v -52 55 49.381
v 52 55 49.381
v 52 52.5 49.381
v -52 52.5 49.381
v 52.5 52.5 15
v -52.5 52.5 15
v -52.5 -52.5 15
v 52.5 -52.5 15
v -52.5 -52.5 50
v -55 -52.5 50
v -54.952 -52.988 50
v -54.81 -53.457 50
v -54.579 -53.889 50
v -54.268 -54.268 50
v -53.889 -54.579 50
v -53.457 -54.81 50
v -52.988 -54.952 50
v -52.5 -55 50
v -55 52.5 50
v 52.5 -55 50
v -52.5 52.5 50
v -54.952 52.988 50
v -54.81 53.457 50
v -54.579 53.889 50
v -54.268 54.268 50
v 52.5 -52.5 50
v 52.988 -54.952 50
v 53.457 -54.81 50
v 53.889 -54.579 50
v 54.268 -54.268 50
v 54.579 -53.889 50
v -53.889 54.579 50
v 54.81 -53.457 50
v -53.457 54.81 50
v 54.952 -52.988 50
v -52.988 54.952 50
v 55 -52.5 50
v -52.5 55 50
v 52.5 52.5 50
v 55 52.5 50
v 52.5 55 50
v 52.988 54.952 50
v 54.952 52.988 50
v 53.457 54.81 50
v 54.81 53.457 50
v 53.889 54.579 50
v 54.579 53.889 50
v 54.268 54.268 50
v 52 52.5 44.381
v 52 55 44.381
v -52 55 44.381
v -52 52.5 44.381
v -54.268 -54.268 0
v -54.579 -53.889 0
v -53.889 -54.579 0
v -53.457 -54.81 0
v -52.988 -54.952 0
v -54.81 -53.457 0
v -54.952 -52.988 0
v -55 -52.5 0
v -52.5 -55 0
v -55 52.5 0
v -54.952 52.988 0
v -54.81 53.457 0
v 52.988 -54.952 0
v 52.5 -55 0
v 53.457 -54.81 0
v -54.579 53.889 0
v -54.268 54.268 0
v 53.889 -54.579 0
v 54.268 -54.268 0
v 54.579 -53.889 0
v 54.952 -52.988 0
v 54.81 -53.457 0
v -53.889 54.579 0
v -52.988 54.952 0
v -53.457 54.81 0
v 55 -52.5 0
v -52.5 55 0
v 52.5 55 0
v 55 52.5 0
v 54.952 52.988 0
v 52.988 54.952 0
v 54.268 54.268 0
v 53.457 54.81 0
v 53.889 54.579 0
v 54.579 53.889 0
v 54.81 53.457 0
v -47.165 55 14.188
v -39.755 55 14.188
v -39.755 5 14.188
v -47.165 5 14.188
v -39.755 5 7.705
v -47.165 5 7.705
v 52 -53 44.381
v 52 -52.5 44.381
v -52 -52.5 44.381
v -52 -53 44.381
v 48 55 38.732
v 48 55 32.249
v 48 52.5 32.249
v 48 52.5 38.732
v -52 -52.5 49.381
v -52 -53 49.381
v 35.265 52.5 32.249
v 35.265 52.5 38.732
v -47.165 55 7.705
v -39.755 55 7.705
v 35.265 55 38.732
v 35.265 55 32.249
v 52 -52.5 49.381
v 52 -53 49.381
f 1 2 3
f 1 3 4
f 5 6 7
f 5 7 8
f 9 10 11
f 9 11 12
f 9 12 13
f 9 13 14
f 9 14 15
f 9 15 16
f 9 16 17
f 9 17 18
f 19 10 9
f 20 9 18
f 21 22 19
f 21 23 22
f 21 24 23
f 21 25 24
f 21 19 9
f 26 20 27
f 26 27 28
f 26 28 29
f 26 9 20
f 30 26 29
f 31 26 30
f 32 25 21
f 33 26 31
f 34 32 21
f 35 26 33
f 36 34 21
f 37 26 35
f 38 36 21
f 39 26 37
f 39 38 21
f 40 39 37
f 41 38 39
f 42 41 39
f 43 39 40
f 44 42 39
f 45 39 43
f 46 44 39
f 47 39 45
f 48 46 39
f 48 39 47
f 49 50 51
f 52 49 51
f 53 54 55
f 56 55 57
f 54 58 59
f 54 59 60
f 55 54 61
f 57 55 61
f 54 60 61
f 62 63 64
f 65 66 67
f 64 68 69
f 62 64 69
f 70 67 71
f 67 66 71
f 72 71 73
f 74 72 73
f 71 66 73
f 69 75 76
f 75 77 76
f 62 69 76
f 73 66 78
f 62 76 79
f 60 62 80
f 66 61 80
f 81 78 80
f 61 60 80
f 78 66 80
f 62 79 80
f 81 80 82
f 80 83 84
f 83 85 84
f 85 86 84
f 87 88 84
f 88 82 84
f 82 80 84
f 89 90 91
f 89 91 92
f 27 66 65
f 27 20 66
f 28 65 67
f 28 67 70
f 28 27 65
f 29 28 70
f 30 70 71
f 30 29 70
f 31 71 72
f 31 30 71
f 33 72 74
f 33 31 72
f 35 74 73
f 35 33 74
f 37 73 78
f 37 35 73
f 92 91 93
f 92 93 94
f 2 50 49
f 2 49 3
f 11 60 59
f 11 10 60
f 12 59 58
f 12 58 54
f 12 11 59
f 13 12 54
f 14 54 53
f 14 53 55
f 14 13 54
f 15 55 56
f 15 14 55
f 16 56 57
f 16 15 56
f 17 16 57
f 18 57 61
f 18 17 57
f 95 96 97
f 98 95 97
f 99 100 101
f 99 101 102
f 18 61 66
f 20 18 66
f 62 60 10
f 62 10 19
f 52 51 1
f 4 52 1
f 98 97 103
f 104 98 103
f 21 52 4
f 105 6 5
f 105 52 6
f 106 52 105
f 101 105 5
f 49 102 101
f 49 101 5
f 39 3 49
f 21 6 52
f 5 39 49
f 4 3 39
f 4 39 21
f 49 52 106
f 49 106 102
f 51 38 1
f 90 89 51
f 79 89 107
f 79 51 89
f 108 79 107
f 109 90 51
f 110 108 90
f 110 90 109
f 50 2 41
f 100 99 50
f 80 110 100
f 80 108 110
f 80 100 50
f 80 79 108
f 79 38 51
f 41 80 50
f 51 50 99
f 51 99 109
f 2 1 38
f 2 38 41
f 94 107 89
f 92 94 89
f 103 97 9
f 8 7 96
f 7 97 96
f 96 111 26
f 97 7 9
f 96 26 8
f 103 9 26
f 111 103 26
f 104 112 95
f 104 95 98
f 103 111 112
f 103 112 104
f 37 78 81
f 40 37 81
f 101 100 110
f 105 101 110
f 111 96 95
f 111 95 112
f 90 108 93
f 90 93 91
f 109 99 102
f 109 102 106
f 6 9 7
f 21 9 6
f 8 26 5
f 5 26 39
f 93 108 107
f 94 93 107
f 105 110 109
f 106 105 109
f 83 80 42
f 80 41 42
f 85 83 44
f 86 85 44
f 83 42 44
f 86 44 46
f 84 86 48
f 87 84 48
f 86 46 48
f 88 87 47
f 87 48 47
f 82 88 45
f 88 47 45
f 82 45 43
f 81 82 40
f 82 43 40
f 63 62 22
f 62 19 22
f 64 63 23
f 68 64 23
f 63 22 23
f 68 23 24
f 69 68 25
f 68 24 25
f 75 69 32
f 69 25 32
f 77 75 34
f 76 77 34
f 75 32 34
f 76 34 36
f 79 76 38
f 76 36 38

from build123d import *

# Parameters (mm, degrees)
F0_W     = 110
F0_H     = 110
F1_DEPTH = 50
F2_W     = 105
F2_H     = 105
F3_DEPTH = 35
F4_W     = 104
F4_H     = 5
F5_DEPTH = 108
F6_W     = 12.735002
F6_H     = 6.483276
F6_W_2   = 7.409461
F6_H_2   = 6.483274
F7_DEPTH = 50
F8_R     = 2.5


with BuildPart() as f1:
    # F0 (on Top) → F1 (new body)
    with BuildSketch(Plane.XY):
        Rectangle(F0_W, F0_H)
    extrude(amount=F1_DEPTH)

    # F2 (on face) → F3 (cut)
    with BuildSketch(Plane.XY.offset(50)):
        Rectangle(F2_W, F2_H)
    extrude(amount=-F3_DEPTH, mode=Mode.SUBTRACT)

    # F4 (on face) → F5 (cut)
    with BuildSketch(Plane(origin=(0, 55, 0), x_dir=(-1, 0, 0), z_dir=(0, 1, 0))):
        with Locations((0, 46.881082)):
            Rectangle(F4_W, F4_H)
    extrude(amount=-F5_DEPTH, mode=Mode.SUBTRACT)

    # F6 (on face) → F7 (cut)
    with BuildSketch(Plane(origin=(0, 55, 0), x_dir=(-1, 0, 0), z_dir=(0, 1, 0))):
        with Locations((-41.632924, 35.490146)):
            Rectangle(F6_W, F6_H)
        with Locations((43.460033, 10.946326)):
            Rectangle(F6_W_2, F6_H_2)
    extrude(amount=-F7_DEPTH, mode=Mode.SUBTRACT)

    # F8
    f8_edges = [f1.edges().sort_by_distance(p)[0] for p in [
        (-55, 55, 25),
        (-55, -55, 25),
        (55, 55, 25),
        (55, -55, 25),
    ]]
    fillet(f8_edges, radius=F8_R)


solid = f1.part
